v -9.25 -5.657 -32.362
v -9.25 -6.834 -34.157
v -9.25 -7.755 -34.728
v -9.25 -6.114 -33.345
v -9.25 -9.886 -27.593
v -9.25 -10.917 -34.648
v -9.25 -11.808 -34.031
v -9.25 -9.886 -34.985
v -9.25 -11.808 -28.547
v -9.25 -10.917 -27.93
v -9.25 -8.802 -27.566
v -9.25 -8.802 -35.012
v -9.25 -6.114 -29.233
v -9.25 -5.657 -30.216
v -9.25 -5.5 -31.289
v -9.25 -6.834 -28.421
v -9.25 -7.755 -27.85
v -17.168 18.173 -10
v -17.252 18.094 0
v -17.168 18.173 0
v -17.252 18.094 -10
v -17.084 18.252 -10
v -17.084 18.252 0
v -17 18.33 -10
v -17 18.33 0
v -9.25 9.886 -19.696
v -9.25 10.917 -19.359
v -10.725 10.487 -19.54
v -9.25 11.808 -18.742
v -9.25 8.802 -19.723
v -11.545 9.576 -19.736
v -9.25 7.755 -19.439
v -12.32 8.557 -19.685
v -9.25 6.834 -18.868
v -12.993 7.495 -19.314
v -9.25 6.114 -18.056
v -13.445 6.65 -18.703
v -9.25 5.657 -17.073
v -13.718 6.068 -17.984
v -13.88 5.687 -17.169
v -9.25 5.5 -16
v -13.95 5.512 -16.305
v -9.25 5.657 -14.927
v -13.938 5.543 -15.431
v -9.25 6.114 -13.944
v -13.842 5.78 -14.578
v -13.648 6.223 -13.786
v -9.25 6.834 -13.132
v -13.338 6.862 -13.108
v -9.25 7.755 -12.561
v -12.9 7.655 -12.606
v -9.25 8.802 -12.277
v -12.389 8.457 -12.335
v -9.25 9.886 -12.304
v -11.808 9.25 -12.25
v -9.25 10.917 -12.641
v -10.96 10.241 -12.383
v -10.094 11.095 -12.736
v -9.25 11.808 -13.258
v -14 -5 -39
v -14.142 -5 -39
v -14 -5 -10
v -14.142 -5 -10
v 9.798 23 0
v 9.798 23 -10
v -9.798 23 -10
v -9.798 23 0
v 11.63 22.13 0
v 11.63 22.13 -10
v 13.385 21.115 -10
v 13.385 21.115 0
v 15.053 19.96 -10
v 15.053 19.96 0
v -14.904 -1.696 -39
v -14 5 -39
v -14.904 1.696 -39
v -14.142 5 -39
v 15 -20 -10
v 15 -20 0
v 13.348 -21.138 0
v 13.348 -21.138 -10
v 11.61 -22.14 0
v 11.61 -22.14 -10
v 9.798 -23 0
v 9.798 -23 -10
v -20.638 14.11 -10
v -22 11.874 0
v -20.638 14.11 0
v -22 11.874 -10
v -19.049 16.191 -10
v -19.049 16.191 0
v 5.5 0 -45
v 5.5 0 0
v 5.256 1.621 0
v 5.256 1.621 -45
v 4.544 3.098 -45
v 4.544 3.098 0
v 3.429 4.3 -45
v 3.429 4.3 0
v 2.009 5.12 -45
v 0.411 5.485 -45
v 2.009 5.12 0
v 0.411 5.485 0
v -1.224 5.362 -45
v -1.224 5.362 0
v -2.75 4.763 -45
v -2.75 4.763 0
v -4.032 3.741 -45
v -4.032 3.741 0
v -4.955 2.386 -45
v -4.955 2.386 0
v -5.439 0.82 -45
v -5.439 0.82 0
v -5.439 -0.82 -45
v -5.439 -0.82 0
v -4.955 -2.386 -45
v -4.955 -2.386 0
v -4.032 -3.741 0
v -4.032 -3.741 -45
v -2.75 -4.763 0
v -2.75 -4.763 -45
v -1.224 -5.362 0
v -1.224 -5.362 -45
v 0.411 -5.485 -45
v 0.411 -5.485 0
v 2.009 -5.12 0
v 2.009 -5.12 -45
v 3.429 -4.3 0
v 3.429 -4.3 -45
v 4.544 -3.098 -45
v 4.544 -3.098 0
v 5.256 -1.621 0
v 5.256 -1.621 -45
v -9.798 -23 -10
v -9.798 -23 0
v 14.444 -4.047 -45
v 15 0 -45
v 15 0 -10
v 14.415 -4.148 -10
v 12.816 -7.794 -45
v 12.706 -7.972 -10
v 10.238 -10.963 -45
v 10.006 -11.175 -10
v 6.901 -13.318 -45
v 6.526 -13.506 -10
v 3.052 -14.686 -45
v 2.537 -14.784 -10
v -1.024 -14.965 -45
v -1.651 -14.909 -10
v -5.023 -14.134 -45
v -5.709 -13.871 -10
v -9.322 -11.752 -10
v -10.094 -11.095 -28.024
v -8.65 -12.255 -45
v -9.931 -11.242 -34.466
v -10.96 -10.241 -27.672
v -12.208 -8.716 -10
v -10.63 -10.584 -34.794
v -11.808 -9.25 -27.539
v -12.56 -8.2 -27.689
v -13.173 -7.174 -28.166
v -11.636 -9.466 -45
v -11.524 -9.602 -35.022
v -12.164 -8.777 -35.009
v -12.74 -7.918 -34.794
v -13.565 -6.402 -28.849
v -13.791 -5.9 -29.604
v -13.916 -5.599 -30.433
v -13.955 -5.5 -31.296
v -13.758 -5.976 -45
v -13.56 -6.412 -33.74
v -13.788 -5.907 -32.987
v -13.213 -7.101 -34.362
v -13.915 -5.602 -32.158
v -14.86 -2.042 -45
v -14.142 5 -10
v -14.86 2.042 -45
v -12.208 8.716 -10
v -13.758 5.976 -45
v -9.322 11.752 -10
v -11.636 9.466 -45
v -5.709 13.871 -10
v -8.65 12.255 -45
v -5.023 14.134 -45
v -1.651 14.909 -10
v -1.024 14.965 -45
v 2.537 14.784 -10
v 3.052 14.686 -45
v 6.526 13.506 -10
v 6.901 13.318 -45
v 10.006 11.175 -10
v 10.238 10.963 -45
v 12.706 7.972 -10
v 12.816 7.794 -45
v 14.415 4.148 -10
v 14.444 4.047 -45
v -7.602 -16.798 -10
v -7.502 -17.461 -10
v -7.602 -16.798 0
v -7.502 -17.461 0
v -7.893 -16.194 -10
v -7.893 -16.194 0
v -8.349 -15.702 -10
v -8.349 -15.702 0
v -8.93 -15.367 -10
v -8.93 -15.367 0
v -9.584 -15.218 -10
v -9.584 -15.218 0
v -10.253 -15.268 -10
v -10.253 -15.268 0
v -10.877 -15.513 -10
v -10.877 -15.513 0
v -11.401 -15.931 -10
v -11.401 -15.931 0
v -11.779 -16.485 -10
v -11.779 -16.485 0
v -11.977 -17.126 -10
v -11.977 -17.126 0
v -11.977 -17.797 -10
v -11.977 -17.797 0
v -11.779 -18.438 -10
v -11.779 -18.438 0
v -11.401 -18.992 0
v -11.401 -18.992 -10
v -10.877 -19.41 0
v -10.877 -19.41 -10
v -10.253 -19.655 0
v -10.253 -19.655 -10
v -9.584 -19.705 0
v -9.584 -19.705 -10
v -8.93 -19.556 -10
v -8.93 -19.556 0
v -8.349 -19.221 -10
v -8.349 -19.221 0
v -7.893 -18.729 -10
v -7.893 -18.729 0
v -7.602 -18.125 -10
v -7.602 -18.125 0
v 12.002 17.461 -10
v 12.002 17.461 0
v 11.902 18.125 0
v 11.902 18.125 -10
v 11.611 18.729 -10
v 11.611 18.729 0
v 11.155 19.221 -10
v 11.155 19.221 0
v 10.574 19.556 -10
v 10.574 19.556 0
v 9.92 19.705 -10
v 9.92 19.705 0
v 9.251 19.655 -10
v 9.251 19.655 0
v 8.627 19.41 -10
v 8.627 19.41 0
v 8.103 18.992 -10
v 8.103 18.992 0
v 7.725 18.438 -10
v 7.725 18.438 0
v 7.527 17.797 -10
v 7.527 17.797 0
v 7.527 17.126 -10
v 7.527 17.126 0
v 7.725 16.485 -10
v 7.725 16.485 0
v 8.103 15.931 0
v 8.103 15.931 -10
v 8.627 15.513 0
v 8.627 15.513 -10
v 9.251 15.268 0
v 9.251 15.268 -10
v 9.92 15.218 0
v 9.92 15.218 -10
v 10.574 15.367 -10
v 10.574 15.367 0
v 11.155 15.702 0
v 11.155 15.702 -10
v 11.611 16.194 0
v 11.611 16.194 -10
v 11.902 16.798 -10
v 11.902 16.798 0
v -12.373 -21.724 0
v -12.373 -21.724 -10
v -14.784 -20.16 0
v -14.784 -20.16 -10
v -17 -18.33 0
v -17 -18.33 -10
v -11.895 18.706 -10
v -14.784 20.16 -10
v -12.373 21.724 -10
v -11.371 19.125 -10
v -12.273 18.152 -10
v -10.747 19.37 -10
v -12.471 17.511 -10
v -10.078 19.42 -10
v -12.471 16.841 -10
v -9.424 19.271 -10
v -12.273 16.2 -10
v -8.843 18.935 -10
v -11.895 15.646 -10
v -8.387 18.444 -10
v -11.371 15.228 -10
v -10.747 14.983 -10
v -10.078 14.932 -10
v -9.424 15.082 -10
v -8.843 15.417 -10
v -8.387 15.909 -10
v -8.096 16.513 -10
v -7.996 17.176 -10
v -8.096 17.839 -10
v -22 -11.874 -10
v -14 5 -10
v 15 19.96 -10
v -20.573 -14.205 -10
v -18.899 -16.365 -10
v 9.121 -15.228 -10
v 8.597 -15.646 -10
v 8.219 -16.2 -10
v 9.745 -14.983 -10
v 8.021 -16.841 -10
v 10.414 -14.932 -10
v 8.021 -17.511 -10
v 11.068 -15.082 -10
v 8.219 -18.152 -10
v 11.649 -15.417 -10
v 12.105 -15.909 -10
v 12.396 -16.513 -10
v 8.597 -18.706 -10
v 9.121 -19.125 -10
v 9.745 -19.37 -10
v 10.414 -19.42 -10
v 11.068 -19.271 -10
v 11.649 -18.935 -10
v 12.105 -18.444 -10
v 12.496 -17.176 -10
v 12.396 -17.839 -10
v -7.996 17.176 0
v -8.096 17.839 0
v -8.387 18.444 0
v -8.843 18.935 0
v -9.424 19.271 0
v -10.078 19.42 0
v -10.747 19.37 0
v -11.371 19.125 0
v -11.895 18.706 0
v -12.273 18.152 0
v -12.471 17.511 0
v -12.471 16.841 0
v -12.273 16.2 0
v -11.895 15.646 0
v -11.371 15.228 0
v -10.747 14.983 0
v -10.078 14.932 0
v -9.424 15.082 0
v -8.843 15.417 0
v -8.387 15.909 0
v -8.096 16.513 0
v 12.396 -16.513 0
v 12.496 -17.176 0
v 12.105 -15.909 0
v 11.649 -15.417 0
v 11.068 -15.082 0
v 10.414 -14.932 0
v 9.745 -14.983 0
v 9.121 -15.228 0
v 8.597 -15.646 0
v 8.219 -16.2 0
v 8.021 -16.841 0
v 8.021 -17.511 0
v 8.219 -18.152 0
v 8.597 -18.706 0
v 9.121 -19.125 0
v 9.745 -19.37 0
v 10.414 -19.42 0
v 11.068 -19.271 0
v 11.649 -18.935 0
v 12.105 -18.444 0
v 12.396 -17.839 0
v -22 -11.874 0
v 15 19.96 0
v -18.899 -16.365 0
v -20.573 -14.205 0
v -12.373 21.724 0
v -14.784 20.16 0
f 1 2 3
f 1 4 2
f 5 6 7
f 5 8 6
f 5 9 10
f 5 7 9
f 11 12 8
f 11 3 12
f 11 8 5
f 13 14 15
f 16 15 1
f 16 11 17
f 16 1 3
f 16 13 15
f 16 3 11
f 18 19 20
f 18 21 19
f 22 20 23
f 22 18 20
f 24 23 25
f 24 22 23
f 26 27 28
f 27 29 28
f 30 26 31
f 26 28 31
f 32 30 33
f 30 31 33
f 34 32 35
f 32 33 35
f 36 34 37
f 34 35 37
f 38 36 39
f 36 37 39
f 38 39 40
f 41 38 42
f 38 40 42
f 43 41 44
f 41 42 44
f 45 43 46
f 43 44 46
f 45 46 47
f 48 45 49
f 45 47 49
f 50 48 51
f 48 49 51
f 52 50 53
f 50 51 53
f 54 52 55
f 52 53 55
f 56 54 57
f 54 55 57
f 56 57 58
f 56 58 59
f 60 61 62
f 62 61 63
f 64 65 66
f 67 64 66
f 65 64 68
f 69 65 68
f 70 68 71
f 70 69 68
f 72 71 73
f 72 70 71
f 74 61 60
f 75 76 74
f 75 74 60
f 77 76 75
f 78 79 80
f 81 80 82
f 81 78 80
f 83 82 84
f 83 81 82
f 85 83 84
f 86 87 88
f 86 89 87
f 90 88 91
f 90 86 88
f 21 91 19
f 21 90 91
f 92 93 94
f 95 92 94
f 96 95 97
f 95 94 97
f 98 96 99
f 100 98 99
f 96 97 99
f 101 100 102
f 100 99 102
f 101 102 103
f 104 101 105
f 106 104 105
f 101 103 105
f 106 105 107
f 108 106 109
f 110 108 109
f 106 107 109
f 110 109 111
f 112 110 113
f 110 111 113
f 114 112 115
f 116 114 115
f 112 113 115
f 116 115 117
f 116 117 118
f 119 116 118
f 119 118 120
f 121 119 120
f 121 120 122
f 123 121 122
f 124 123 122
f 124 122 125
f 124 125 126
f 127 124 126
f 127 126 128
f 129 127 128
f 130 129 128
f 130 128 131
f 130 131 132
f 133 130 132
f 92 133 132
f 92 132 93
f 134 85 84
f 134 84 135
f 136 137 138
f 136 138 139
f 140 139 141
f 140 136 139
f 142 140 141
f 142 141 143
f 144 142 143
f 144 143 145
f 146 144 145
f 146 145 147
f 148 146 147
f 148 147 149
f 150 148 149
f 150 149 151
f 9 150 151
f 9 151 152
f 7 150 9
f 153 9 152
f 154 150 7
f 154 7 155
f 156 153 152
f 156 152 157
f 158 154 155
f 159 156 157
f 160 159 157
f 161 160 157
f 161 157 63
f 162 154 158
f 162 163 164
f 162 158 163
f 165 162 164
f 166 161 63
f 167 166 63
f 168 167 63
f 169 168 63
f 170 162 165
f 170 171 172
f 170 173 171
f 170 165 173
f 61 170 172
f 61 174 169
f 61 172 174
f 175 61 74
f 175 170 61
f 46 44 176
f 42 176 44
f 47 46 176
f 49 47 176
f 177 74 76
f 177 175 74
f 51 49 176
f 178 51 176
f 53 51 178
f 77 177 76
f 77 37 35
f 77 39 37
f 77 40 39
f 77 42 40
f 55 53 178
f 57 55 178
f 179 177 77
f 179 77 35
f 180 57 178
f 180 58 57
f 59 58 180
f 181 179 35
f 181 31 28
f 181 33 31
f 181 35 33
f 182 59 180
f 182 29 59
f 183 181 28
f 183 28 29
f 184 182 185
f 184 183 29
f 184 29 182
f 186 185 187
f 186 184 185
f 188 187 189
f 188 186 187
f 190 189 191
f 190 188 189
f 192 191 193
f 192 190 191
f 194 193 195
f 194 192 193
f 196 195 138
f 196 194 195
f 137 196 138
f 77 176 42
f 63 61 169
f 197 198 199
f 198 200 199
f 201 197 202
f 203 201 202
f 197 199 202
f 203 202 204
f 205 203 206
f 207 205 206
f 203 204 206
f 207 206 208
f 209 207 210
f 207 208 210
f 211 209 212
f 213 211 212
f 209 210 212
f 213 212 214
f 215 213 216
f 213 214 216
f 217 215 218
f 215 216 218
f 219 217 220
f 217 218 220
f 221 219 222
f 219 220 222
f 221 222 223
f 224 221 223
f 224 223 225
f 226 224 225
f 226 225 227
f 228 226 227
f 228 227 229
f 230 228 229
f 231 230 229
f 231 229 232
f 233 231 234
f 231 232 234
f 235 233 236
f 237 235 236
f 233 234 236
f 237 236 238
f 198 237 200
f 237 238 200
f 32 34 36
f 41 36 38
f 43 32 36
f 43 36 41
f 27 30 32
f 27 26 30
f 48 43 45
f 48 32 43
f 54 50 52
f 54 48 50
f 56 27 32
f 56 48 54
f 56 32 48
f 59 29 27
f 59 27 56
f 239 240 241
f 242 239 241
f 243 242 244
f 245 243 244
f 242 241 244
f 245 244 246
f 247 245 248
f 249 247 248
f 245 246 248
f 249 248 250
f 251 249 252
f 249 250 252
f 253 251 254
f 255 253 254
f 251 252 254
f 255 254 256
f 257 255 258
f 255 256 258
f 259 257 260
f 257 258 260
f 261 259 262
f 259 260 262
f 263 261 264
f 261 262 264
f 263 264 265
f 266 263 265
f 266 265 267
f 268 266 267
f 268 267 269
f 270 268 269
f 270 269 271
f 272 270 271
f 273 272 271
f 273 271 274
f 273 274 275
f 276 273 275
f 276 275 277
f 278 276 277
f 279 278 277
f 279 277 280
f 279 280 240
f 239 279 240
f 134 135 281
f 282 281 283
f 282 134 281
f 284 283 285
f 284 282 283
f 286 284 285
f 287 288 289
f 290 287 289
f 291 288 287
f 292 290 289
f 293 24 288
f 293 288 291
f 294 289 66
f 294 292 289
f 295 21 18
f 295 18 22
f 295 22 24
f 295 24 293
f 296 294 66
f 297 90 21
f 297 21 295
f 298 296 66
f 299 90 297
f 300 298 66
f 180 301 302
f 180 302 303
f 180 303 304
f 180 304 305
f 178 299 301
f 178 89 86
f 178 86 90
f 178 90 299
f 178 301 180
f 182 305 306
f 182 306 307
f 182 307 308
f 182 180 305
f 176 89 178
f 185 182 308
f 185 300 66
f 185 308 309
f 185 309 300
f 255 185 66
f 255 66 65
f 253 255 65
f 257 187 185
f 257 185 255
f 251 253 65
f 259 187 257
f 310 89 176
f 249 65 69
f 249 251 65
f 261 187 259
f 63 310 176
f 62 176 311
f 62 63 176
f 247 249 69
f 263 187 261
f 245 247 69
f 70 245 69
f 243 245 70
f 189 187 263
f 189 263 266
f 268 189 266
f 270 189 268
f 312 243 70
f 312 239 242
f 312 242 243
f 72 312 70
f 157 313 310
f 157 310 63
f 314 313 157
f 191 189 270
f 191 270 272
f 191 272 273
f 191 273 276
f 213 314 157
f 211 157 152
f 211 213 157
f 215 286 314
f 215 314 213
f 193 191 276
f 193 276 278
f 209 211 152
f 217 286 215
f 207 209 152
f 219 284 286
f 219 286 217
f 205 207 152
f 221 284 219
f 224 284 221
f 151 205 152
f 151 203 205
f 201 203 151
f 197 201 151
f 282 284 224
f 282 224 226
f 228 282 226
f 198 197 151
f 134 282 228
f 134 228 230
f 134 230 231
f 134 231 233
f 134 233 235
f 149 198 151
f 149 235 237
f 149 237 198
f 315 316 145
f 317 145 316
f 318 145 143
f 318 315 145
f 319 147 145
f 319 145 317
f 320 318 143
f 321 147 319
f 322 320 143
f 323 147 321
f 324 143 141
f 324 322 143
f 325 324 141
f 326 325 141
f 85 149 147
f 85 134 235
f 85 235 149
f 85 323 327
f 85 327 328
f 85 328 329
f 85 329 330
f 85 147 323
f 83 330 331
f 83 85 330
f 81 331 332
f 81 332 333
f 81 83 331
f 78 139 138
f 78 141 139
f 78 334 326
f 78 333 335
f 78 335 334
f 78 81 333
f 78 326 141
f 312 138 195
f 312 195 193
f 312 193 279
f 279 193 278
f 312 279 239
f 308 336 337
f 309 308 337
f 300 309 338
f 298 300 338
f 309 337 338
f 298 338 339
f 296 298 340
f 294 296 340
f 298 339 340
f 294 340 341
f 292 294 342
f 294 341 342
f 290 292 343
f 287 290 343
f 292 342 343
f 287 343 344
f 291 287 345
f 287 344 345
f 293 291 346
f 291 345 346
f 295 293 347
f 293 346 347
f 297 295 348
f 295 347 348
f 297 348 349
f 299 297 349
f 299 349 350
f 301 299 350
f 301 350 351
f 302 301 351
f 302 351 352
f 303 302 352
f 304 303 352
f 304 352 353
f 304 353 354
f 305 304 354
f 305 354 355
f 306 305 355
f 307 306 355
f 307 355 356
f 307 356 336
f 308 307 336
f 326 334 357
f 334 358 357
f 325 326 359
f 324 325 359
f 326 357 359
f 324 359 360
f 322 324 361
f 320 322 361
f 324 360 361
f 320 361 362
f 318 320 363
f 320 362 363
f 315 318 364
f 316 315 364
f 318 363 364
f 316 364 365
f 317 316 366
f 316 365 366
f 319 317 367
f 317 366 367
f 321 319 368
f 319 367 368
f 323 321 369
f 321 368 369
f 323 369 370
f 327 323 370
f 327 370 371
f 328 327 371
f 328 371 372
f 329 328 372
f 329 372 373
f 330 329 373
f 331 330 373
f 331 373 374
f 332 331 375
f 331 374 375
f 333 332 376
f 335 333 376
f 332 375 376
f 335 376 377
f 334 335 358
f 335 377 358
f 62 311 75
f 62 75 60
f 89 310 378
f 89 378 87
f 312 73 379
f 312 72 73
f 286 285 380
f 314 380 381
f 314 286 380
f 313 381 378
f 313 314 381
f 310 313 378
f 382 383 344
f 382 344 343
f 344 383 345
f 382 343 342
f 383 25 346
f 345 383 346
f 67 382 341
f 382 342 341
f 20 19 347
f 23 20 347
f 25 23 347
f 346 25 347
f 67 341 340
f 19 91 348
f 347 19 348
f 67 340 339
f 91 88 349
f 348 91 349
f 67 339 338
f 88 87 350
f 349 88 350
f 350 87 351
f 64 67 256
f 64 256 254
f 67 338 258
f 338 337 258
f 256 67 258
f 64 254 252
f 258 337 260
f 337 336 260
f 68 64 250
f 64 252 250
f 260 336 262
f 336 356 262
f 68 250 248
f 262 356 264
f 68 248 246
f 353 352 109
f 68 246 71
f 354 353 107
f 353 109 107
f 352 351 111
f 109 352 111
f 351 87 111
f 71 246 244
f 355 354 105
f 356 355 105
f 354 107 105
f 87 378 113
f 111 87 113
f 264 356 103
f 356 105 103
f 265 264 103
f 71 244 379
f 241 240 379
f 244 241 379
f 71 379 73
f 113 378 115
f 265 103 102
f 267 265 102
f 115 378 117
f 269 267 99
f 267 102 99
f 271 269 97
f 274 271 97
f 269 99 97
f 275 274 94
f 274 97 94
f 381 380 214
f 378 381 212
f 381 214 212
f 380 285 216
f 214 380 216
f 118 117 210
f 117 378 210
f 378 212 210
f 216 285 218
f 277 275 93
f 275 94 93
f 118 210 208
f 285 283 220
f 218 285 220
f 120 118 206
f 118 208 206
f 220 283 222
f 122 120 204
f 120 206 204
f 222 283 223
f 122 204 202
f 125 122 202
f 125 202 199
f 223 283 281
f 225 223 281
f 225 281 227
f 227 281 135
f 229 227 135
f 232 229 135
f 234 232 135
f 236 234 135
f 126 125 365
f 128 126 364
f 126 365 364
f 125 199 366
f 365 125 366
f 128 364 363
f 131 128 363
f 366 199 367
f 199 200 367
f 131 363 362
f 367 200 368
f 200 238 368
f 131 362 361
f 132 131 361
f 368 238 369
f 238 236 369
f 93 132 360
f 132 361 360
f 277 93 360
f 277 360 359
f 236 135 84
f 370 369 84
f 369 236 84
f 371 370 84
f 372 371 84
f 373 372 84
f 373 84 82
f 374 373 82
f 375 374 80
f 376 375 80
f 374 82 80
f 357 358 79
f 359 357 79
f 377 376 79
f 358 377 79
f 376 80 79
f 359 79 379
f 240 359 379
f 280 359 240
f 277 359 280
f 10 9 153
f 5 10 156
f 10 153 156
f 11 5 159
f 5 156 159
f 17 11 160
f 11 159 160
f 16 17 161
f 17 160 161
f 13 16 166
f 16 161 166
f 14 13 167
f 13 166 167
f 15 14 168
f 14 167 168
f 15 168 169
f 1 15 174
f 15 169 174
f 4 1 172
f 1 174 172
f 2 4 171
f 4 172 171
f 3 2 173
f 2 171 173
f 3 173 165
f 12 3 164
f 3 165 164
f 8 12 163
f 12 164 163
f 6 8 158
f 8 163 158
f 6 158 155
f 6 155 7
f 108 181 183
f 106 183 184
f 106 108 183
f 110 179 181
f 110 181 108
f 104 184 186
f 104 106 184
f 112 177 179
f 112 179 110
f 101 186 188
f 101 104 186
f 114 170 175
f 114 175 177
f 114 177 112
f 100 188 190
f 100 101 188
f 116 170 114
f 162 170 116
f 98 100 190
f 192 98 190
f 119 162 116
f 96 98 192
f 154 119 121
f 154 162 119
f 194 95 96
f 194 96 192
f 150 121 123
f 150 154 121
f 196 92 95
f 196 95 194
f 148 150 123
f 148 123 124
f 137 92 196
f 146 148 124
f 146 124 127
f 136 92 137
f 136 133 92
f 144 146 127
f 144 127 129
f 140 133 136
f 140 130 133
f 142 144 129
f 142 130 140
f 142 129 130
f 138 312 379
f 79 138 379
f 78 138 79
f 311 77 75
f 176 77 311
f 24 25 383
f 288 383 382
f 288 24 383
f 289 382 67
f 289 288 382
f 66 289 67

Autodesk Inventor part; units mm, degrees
ref_plane "YZ Plane" through (0, 0, 0) normal (1, 0, 0) x (0, 1, 0)
ref_plane "XZ Plane" through (0, 0, 0) normal (0, 1, 0) x (-1, 0, 0)
sketch "Sketch1" plane through (0, 0, 0) normal (0, 1, 0) x (-1, 0, 0)
  line L0 (0, 0) -> (-25, 0)
  line L1 (-25, 0) -> (-25, -10)
  line L2 (-25, -10) -> (-15, -10)
  line L3 (-15, -10) -> (-15, -45)
  line L4 (-15, -45) -> (0, -45)
  line L5 (0, 0) -> (0, -45)
  dimension "d3" = 25
  dimension "d4" = 10
  dimension "d5" = 10
  dimension "d6" = 35
  dimension "d7" = 15
revolve "Revolution1" add sketch "Sketch1" angle 360 about axis through (0, 0, 0) along (0, 0, -1)
sketch "Sketch2" plane through (0, 0, 0) normal (0, 0, 1) x (1, 0, 0)
  line L0 (0, 0) -> (30.242, 0) construction
  line L1 (0, 0.5707) -> (22.435, 0.5707) construction
  circle A0 centre (9.7519, 17.4614) radius 2.25
  circle A1 centre (19.998, 0.2854) radius 2.25
  circle A2 centre (10.2461, -17.1761) radius 2.25
  circle A3 centre (-9.7519, -17.4614) radius 2.25
  circle A4 centre (-19.998, -0.2854) radius 2.25
  circle A5 centre (-10.2461, 17.1761) radius 2.25
  dimension "d12" = 4.5
  dimension "d15" = 360
extrude "Extrusion1" cut sketch "Sketch2" against normal through all
sketch "Sketch3" plane through (0, 0, 0) normal (0, 0, 1) x (1, 0, 0)
  circle A0 centre (0, 0) radius 5.5
  dimension "d19" = 11
extrude "Extrusion2" cut sketch "Sketch3" against normal through all
thread "Thread1" size "1/2-13 UNC" class "2B" standard "ANSI Unified Screw Threads" full length
sketch "Sketch4" plane through (0, 0, 0) normal (0, 0, 1) x (1, 0, 0)
  circle A0 centre (0, 0) radius 25 projected
  line L0 (-17, 0) -> (-17, 18.3303)
  line L1 (-17, 0) -> (-17, -18.3303)
extrude "Extrusion3" cut sketch "Sketch4" against normal blind 15 contours L0 L1 A0 picked at (-18.2676, -10.7318)
ref_plane "Work Plane1" through (-15, 0, -27.5) normal (-1, 0, 0) x (0, -1, 0)
sketch "Sketch5" plane through (-15, 0, -27.5) normal (-1, 0, 0) x (0, -1, 0)
  line L0 (1.9646, 17.5) -> (-2.5354, 17.5) projected
  line L1 (15, -17.5) -> (-15, -17.5) projected
  line L2 (0, -11.5) -> (-5, -11.5)
  line L3 (-5.5, 27.5) -> (-5.5, -17.5) projected
  line L4 (-5, -11.5) -> (-5, 17.5)
  line L5 (15, 17.5) -> (-15, 17.5) projected
  line L6 (0, -11.5) -> (5, -11.5)
  line L7 (5, -11.5) -> (5, 17.5)
  line L8 (5, 17.5) -> (-5, 17.5)
  point P0 (0, 27.5)
extrude "Extrusion4" cut sketch "Sketch5" against normal blind 1
sketch "Sketch9" plane through (0, 0, -10) normal (0, 0, -1) x (-1, 0, 0)
  line L0 (14, 5) -> (14, -5) projected
  line L1 (14, 0) -> (22, 0)
  line L2 (22, 0) -> (22, -11.8743)
  line L3 (22, -11.8743) -> (22, 11.8743)
  arc A0 (22, 11.8743) -> (17.2515, 18.0938) centre (0, 0) ccw
  line L4 (17, -18.3303) -> (17, 18.3303) projected
  line L5 (17, 18.3303) -> (17, -18.3303)
  line L6 (17, 18.3303) -> (17, -18.3303) projected
  arc A1 (17, -18.3303) -> (22, -11.8743) centre (0, 0) ccw
  arc A2 (22, 11.8743) -> (17, 18.3303) centre (0, 0) ccw
  arc A3 (14.1421, 5) -> (14.1421, -5) centre (0, 0) ccw projected
  dimension "d59" = 8
extrude "Extrusion5" add sketch "Sketch9" against normal blind 10
sketch "Sketch20" plane through (-14, 0, -27.5) normal (-1, 0, 0) x (0, 0, 1)
  line L0 (17.5, -11.8743) -> (17.5, 11.8743) projected
  circle A0 centre (11.5, 9.25) radius 3.75
  line L1 (-17.5, -15) -> (-17.5, 15) projected
  line L2 (11.5, 9.25) -> (-3.7889, -9.25)
  circle A1 centre (-3.7889, -9.25) radius 3.75
  point P0 (27.5, 0)
  dimension "d85" = 7.5
  dimension "d87" = 24
  dimension "d88" = 7.5
extrude "Extrusion8" cut sketch "Sketch20" against normal blind 4.75
sketch "Sketch21" plane through (-22, -11.8743, -10) normal (0, 0, -1) x (-1, 0, 0)
  point P0 (-22, 11.8743)
sketch "Sketch22" plane through (-22, -11.8743, -10) normal (0, 0, -1) x (-1, 0, 0)
  point P0 (-22, 11.8743)
sketch "Sketch23" plane through (-22, -11.8743, -10) normal (0, 0, -1) x (-1, 0, 0)
  arc A0 (-7.8579, 16.8743) -> (-7.8579, 6.8743) centre (-22, 11.8743) ccw projected
  arc A1 (0, 23.7487) -> (0, 0) centre (-22, 11.8743) ccw projected
  line L0 (-37, -8.1257) -> (-47.4738, -8.1257)
  line L1 (-47.4738, -8.1257) -> (-47.4738, 31.8346)
  line L2 (-47.4738, 31.8346) -> (-37, 31.8346)
  line L3 (-37, 31.8346) -> (-37, -8.1257)
  line L4 (-22, -13.1257) -> (-22, -11.1257) construction
  line L5 (-31.798, -11.1257) -> (-12.0273, -11.1257)
  line L6 (-12.0273, -11.1257) -> (-12.0273, -17.6927)
  line L7 (-12.0273, -17.6927) -> (-31.798, -17.6927)
  line L8 (-31.798, -17.6927) -> (-31.798, -11.1257)
  line L9 (-22, 11.8743) -> (-7, 11.8743) construction
  line L10 (-31.798, 34.8743) -> (-12.0273, 34.8743)
  line L11 (-12.0273, 34.8743) -> (-12.0273, 41.4414)
  line L12 (-12.0273, 41.4414) -> (-31.798, 41.4414)
  line L13 (-31.798, 41.4414) -> (-31.798, 34.8743)
  dimension "d91" = 2
extrude "Extrusion9" cut sketch "Sketch23" against normal blind 10
properties part number "nut"
